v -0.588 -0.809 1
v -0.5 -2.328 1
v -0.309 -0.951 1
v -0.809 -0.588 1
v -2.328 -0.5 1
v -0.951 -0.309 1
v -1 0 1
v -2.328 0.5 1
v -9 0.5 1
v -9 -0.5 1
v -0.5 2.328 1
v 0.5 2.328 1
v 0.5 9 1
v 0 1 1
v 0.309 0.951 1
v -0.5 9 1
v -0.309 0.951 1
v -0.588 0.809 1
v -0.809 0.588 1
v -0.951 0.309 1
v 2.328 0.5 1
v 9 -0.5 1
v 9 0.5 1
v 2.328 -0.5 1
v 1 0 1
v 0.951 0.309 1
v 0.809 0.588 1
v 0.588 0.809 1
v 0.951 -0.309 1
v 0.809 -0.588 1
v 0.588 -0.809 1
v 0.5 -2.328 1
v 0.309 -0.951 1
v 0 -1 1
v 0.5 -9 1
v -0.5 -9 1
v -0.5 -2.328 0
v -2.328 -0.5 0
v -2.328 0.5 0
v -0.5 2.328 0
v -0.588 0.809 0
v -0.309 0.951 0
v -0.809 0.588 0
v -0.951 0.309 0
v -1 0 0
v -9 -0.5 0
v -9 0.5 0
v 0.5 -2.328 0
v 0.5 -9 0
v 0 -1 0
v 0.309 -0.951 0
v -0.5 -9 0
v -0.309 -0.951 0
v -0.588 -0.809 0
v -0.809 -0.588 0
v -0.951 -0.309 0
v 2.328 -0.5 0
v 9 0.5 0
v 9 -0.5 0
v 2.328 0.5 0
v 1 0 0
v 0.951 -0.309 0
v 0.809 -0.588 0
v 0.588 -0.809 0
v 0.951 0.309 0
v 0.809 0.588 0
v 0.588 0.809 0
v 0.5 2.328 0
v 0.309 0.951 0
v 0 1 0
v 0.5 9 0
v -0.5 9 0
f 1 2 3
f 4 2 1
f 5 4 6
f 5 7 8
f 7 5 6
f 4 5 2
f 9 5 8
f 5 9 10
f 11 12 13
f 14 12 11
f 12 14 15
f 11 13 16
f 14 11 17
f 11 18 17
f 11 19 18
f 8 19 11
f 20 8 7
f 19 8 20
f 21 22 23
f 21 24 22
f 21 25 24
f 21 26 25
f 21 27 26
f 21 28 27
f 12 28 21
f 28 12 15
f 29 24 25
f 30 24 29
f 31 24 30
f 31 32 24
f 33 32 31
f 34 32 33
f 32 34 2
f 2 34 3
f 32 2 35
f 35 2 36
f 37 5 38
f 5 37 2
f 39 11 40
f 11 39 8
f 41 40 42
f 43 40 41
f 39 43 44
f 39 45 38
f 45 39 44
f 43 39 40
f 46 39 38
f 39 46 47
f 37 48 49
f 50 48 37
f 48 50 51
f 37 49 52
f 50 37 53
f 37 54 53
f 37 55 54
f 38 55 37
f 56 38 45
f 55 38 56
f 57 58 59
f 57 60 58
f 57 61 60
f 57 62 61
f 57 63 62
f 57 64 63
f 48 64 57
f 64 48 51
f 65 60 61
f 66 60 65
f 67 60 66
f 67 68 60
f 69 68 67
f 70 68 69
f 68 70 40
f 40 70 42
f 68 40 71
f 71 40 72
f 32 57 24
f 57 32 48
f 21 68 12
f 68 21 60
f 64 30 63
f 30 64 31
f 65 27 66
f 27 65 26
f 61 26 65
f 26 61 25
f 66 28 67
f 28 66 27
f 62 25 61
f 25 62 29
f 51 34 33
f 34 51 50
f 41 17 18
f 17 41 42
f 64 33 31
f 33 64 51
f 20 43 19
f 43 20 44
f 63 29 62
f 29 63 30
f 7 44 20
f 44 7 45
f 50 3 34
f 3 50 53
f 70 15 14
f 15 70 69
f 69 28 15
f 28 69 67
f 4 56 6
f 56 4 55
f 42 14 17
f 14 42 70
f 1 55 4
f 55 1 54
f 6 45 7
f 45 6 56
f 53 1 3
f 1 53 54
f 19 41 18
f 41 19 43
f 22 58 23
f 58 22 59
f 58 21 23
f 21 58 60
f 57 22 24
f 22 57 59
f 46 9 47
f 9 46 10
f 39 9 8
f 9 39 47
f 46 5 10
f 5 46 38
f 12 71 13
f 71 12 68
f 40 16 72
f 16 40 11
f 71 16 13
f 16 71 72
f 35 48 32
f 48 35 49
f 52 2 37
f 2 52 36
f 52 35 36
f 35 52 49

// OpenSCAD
module brace() {
  cube([18,2,3]);
  translate([0,2,0]) cube([2,1,3]);
  translate([16,2,0]) cube([2,1,3]);
  difference() {
    translate([18/2-1.5,0,0]) cube([3,17,3]);
    translate([18/2,13,-5]) rotate([0,0,0]) cylinder(15,1,1,$fn=20);
  }
  translate([2,2,0]) rotate([0,0,-45]) cube([2,10,2]);
  translate([16,2,2]) rotate([0,180,-45+90]) cube([2,10,2]);
}

module bobbin() {
  difference() {
    union() {
      cylinder(25-6,3,3,$fn=50);
      cylinder(1,6,6,$fn=50);
    }
    translate([0,0,-3]) cylinder(25,1,1,$fn=20);
    translate([0,0,16]) cylinder(25,2.5,2.5,$fn=20);
    translate([2,-.5,16]) cube([2,1,4]);
  }
}

module bobbin_lid() {
  difference() {
    cylinder(1,6,6,$fn=50);
    translate([0,0,-3]) cylinder(25,1,1,$fn=20);
  }
}

module lever() {
  translate([1,-.5,0]) cube([8,1,1]);
  translate([-9,-.5,0]) cube([8,1,1]);
  translate([-.5,1,0]) cube([1,8,1]);
  translate([-.5,-9,0]) cube([1,8,1]);
  difference() {
    rotate([0,0,45]) translate([-2,-2,0]) cube([4,4,1]);
    translate([0,0,-3]) cylinder(25,1,1,$fn=20);
  }
}

lever();
